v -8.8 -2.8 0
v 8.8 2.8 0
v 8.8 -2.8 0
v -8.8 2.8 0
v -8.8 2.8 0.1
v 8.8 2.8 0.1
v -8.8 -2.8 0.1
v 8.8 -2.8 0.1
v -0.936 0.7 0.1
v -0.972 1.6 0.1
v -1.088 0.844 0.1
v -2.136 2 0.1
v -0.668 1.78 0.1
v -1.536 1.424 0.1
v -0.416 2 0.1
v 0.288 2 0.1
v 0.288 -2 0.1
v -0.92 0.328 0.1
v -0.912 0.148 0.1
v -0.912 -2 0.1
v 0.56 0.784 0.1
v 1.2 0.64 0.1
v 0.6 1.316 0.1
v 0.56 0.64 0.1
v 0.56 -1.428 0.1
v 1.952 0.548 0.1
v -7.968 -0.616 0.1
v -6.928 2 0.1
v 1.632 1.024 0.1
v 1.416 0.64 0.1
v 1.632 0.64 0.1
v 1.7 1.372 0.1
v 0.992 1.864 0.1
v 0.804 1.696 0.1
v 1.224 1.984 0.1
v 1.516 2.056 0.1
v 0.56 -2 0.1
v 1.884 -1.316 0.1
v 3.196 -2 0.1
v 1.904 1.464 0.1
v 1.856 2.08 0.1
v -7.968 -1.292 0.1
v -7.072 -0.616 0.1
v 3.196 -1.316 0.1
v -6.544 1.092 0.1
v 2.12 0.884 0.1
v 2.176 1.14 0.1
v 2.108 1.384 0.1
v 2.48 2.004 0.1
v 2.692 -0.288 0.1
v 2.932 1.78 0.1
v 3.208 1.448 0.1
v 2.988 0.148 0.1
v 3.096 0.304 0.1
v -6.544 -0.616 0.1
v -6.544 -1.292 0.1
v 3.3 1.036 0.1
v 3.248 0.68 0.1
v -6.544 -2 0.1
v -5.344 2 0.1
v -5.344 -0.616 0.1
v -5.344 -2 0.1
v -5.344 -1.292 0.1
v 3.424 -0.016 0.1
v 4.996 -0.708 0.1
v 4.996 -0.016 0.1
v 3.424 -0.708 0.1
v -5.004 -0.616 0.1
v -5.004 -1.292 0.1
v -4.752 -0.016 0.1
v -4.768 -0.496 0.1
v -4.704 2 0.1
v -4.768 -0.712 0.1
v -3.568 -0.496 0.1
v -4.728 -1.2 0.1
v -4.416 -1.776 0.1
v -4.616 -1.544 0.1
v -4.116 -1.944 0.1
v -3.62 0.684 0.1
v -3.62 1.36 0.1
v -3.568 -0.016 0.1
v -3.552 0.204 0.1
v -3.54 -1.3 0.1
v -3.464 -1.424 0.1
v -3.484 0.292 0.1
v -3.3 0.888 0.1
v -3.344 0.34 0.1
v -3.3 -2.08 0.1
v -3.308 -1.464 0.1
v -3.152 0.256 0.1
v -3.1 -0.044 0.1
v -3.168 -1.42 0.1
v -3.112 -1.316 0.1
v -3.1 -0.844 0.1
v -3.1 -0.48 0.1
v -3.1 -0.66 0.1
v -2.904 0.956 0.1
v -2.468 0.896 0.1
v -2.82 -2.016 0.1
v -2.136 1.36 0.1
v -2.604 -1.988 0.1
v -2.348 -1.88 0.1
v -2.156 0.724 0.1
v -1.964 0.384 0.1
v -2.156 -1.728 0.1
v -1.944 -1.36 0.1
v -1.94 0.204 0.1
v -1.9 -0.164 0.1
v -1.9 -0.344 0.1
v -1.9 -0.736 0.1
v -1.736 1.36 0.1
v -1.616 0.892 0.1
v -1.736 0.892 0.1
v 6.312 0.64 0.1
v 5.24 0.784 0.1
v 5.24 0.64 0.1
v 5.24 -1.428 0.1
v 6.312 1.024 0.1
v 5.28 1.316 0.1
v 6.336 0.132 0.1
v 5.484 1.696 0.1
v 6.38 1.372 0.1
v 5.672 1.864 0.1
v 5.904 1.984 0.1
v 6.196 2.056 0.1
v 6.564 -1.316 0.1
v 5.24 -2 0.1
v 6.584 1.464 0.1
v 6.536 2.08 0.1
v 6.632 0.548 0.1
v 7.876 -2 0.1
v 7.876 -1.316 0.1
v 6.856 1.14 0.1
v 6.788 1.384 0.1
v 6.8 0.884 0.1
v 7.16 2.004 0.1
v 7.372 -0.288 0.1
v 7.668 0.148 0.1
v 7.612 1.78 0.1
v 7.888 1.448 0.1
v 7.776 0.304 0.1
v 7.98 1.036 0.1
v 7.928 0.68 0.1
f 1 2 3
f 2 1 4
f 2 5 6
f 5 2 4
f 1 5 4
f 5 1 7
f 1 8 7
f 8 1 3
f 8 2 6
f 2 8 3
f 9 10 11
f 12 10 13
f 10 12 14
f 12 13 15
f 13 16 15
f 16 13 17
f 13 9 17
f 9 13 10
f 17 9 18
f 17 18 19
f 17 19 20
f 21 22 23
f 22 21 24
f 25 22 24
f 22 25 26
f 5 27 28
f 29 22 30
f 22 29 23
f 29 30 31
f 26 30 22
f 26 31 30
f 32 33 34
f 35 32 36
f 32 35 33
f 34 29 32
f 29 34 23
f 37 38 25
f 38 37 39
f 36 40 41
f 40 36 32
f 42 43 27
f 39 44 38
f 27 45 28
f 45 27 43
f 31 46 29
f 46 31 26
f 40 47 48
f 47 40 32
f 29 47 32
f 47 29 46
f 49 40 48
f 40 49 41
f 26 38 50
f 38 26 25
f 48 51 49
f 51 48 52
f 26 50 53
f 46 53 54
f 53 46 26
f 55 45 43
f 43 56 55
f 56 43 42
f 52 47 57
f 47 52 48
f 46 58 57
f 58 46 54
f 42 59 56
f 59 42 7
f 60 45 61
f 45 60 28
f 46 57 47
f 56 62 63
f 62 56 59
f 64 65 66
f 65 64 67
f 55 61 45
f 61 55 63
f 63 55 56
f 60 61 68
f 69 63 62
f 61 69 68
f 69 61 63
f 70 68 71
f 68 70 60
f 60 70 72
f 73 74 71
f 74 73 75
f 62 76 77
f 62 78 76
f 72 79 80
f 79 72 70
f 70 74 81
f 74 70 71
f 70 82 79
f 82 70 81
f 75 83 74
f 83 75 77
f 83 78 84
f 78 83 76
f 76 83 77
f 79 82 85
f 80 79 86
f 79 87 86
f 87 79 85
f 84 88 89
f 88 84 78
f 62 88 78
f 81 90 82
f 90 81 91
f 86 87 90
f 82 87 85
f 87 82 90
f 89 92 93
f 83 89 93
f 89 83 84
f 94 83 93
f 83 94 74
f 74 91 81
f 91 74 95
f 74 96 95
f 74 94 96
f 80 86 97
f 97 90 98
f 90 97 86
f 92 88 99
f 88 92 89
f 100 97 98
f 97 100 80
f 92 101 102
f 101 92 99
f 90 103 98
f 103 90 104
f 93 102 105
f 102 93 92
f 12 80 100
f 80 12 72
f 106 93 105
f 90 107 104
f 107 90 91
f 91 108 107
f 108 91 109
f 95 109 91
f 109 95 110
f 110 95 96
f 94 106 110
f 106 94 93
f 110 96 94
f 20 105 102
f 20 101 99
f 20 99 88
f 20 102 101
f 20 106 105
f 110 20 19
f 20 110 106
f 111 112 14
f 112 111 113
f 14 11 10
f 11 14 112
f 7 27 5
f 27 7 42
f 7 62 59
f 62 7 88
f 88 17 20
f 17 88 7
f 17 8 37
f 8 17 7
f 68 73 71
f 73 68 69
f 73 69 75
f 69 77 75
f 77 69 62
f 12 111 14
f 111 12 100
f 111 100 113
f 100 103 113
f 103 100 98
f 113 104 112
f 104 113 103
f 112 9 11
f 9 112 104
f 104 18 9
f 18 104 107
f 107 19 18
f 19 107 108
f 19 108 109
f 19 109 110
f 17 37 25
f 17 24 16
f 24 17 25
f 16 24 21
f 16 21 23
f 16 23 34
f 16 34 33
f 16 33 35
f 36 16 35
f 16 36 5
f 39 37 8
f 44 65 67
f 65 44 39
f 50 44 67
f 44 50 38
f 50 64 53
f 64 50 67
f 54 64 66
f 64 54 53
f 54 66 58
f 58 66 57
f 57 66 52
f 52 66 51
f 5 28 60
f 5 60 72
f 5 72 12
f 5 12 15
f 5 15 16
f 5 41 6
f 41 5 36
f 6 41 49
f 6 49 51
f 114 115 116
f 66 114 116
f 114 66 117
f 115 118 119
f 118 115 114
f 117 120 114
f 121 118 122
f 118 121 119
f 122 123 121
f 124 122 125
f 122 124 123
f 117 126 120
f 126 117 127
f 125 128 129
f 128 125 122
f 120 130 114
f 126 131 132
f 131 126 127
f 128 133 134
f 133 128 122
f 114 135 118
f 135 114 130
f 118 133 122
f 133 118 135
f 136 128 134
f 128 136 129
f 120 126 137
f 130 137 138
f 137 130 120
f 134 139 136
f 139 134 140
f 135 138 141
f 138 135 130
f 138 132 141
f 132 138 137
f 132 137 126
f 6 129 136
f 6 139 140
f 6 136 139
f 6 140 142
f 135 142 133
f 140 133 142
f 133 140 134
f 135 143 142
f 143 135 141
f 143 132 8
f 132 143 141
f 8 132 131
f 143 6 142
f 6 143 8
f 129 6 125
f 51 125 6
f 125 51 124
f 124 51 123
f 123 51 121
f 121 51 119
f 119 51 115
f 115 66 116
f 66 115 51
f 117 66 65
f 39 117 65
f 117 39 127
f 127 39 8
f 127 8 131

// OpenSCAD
// file: ../p/box5-12.scad
use <../lib.scad>
function ldraw_lib__box5_12() = [
// 0 Box with 5 Faces without Any Edges
// 0 Name: box5-12.dat
// 0 Author: Chris Dee [cwdee]
// 0 !LDRAW_ORG Primitive UPDATE 2009-02
// 0 !LICENSE Licensed under CC BY 4.0 : see CAreadme.txt
// 
// 0 BFC CERTIFY CCW
  [0,"BFC","CERTIFY"],
  [0,"BFC","CCW"],
// 
// 0 !HISTORY 2009-09-03 [PTadmin] Official Update 2009-02
// 
// 
// 4 16 1 1 1 1 1 -1 -1 1 -1 -1 1 1
  [4,16,1,1,1,1,1,-1,-1,1,-1,-1,1,1],
// 4 16 -1 0 1 1 0 1 1 1 1 -1 1 1
  [4,16,-1,0,1,1,0,1,1,1,1,-1,1,1],
// 4 16 -1 0 -1 -1 0 1 -1 1 1 -1 1 -1
  [4,16,-1,0,-1,-1,0,1,-1,1,1,-1,1,-1],
// 4 16 1 0 -1 -1 0 -1 -1 1 -1 1 1 -1
  [4,16,1,0,-1,-1,0,-1,-1,1,-1,1,1,-1],
// 4 16 1 0 1 1 0 -1 1 1 -1 1 1 1
  [4,16,1,0,1,1,0,-1,1,1,-1,1,1,1],
// 0
];
module ldraw_lib__box5_12(step=0, col=false, unit=2/5, alt=false, line=0.2, solid=!$preview)
    makepoly(ldraw_lib__box5_12(), step=step, col=col, unit=unit, alt=alt, line=line, solid=solid);
ldraw_lib__box5_12(line=0.2);
// main file
use <../lib.scad>
use <s/4201639hs01.scad>
function ldraw_lib__4201639i() = [
// 0 Sticker  0.7 x  2.2 with White "4512-2" on Black Background
// 0 Name: 4201639i.dat
// 0 Author: Gerald Lasser [GeraldLasser]
// 0 !LDRAW_ORG Part UPDATE 2024-04
// 0 !LICENSE Licensed under CC BY 4.0 : see CAreadme.txt
// 
// 0 BFC CERTIFY CCW
  [0,"BFC","CERTIFY"],
  [0,"BFC","CCW"],
// 
// 0 !KEYWORDS Set 4512
// 
// 0 !HISTORY 2024-05-28 [OrionP] Official Update 2024-04
// 
// 
// 1 16 0 0 0 1 0 0 0 1 0 0 0 1 s\4201639hs01.dat
  [1,16,0,0,0,1,0,0,0,1,0,0,0,1, ldraw_lib__s__4201639hs01()],
// 
// 0 // Digit 2
// 3 15 15.78 -.25 1.6 13.1 -.25 1.96 13.1 -.25 1.6
  [3,15,15.78,-.25,1.6,13.1,-.25,1.96,13.1,-.25,1.6],
// 4 0 12.49 -.25 -.04 13.1 -.25 -3.57 15.78 -.25 1.6 13.1 -.25 1.6
  [4,0,12.49,-.25,-.04,13.1,-.25,-3.57,15.78,-.25,1.6,13.1,-.25,1.6],
// 4 15 13.1 -.25 1.96 15.78 -.25 1.6 15.78 -.25 2.56 13.2 -.25 3.29
  [4,15,13.1,-.25,1.96,15.78,-.25,1.6,15.78,-.25,2.56,13.2,-.25,3.29],
// 3 0 13.1 -.25 -3.57 15.84 -.25 .33 15.78 -.25 1.6
  [3,0,13.1,-.25,-3.57,15.84,-.25,.33,15.78,-.25,1.6],
// 4 15 13.71 -.25 4.24 13.2 -.25 3.29 15.78 -.25 2.56 15.95 -.25 3.43
  [4,15,13.71,-.25,4.24,13.2,-.25,3.29,15.78,-.25,2.56,15.95,-.25,3.43],
// 3 15 15.95 -.25 3.43 14.18 -.25 4.66 13.71 -.25 4.24
  [3,15,15.95,-.25,3.43,14.18,-.25,4.66,13.71,-.25,4.24],
// 4 15 14.18 -.25 4.66 15.95 -.25 3.43 15.49 -.25 5.14 14.76 -.25 4.96
  [4,15,14.18,-.25,4.66,15.95,-.25,3.43,15.49,-.25,5.14,14.76,-.25,4.96],
// 4 15 15.84 -.25 .33 13.1 -.25 -3.57 13.1 -.25 -5 16.41 -.25 -3.29
  [4,15,15.84,-.25,.33,13.1,-.25,-3.57,13.1,-.25,-5,16.41,-.25,-3.29],
// 4 15 16.34 -.25 5.2 15.49 -.25 5.14 15.95 -.25 3.43 16.46 -.25 3.66
  [4,15,16.34,-.25,5.2,15.49,-.25,5.14,15.95,-.25,3.43,16.46,-.25,3.66],
// 3 0 15.84 -.25 .33 16.58 -.25 1.37 15.78 -.25 1.6
  [3,0,15.84,-.25,.33,16.58,-.25,1.37,15.78,-.25,1.6],
// 4 15 13.1 -.25 -5 19.69 -.25 -5 19.69 -.25 -3.29 16.41 -.25 -3.29
  [4,15,13.1,-.25,-5,19.69,-.25,-5,19.69,-.25,-3.29,16.41,-.25,-3.29],
// 4 0 17.14 -.25 2.85 16.97 -.25 3.46 16.46 -.25 3.66 15.95 -.25 3.43
  [4,0,17.14,-.25,2.85,16.97,-.25,3.46,16.46,-.25,3.66,15.95,-.25,3.43],
// 4 0 16.58 -.25 1.37 17 -.25 2.21 15.78 -.25 2.56 15.78 -.25 1.6
  [4,0,16.58,-.25,1.37,17,-.25,2.21,15.78,-.25,2.56,15.78,-.25,1.6],
// 4 0 15.95 -.25 3.43 15.78 -.25 2.56 17 -.25 2.21 17.14 -.25 2.85
  [4,0,15.95,-.25,3.43,15.78,-.25,2.56,17,-.25,2.21,17.14,-.25,2.85],
// 4 15 16.34 -.25 5.2 16.46 -.25 3.66 16.97 -.25 3.46 17.9 -.25 5.01
  [4,15,16.34,-.25,5.2,16.46,-.25,3.66,16.97,-.25,3.46,17.9,-.25,5.01],
// 3 15 15.84 -.25 .33 16.41 -.25 -3.29 18.43 -.25 -.72
  [3,15,15.84,-.25,.33,16.41,-.25,-3.29,18.43,-.25,-.72],
// 4 15 19.17 -.25 .37 16.58 -.25 1.37 15.84 -.25 .33 18.43 -.25 -.72
  [4,15,19.17,-.25,.37,16.58,-.25,1.37,15.84,-.25,.33,18.43,-.25,-.72],
// 4 15 19.72 -.25 3.62 19.03 -.25 4.45 17.9 -.25 5.01 16.97 -.25 3.46
  [4,15,19.72,-.25,3.62,19.03,-.25,4.45,17.9,-.25,5.01,16.97,-.25,3.46],
// 4 15 17 -.25 2.21 16.58 -.25 1.37 19.17 -.25 .37 19.44 -.25 .76
  [4,15,17,-.25,2.21,16.58,-.25,1.37,19.17,-.25,.37,19.44,-.25,.76],
// 4 0 18.43 -.25 -.72 19.69 -.25 -3.29 19.44 -.25 .76 19.17 -.25 .37
  [4,0,18.43,-.25,-.72,19.69,-.25,-3.29,19.44,-.25,.76,19.17,-.25,.37],
// 3 0 19.69 -.25 -3.29 18.43 -.25 -.72 16.41 -.25 -3.29
  [3,0,19.69,-.25,-3.29,18.43,-.25,-.72,16.41,-.25,-3.29],
// 3 0 22 -.25 7 16.34 -.25 5.2 17.9 -.25 5.01
  [3,0,22,-.25,7,16.34,-.25,5.2,17.9,-.25,5.01],
// 3 0 22 -.25 7 19.03 -.25 4.45 19.72 -.25 3.62
  [3,0,22,-.25,7,19.03,-.25,4.45,19.72,-.25,3.62],
// 3 0 22 -.25 7 17.9 -.25 5.01 19.03 -.25 4.45
  [3,0,22,-.25,7,17.9,-.25,5.01,19.03,-.25,4.45],
// 3 0 22 -.25 7 19.72 -.25 3.62 19.95 -.25 2.59
  [3,0,22,-.25,7,19.72,-.25,3.62,19.95,-.25,2.59],
// 3 15 17 -.25 2.21 19.95 -.25 2.59 17.14 -.25 2.85
  [3,15,17,-.25,2.21,19.95,-.25,2.59,17.14,-.25,2.85],
// 4 15 16.97 -.25 3.46 17.14 -.25 2.85 19.95 -.25 2.59 19.72 -.25 3.62
  [4,15,16.97,-.25,3.46,17.14,-.25,2.85,19.95,-.25,2.59,19.72,-.25,3.62],
// 4 15 19.44 -.25 .76 19.82 -.25 1.7 19.95 -.25 2.59 17 -.25 2.21
  [4,15,19.44,-.25,.76,19.82,-.25,1.7,19.95,-.25,2.59,17,-.25,2.21],
// 4 0 19.44 -.25 .76 19.69 -.25 -3.29 22 -.25 -7 19.82 -.25 1.7
  [4,0,19.44,-.25,.76,19.69,-.25,-3.29,22,-.25,-7,19.82,-.25,1.7],
// 3 0 22 -.25 -7 19.69 -.25 -3.29 19.69 -.25 -5
  [3,0,22,-.25,-7,19.69,-.25,-3.29,19.69,-.25,-5],
// 4 0 22 -.25 7 19.95 -.25 2.59 19.82 -.25 1.7 22 -.25 -7
  [4,0,22,-.25,7,19.95,-.25,2.59,19.82,-.25,1.7,22,-.25,-7],
// 3 0 16.34 -.25 5.2 22 -.25 7 15.49 -.25 5.14
  [3,0,16.34,-.25,5.2,22,-.25,7,15.49,-.25,5.14],
// 4 0 14.76 -.25 4.96 15.49 -.25 5.14 22 -.25 7 7.33 -.25 4.45
  [4,0,14.76,-.25,4.96,15.49,-.25,5.14,22,-.25,7,7.33,-.25,4.45],
// 3 0 14.76 -.25 4.96 7.33 -.25 4.45 14.18 -.25 4.66
  [3,0,14.76,-.25,4.96,7.33,-.25,4.45,14.18,-.25,4.66],
// 3 0 14.18 -.25 4.66 7.33 -.25 4.45 13.71 -.25 4.24
  [3,0,14.18,-.25,4.66,7.33,-.25,4.45,13.71,-.25,4.24],
// 3 0 13.71 -.25 4.24 7.33 -.25 4.45 13.2 -.25 3.29
  [3,0,13.71,-.25,4.24,7.33,-.25,4.45,13.2,-.25,3.29],
// 3 0 13.2 -.25 3.29 7.33 -.25 4.45 13.1 -.25 1.96
  [3,0,13.2,-.25,3.29,7.33,-.25,4.45,13.1,-.25,1.96],
// 4 0 13.1 -.25 1.96 7.33 -.25 4.45 12.49 -.25 -.04 13.1 -.25 1.6
  [4,0,13.1,-.25,1.96,7.33,-.25,4.45,12.49,-.25,-.04,13.1,-.25,1.6],
// 3 0 13.1 -.25 -3.57 12.49 -.25 -.04 12.49 -.25 -1.77
  [3,0,13.1,-.25,-3.57,12.49,-.25,-.04,12.49,-.25,-1.77],
// 4 0 12.49 -.25 -1.77 7.99 -.25 -5 13.1 -.25 -5 13.1 -.25 -3.57
  [4,0,12.49,-.25,-1.77,7.99,-.25,-5,13.1,-.25,-5,13.1,-.25,-3.57],
// 3 0 13.1 -.25 -5 7.99 -.25 -5 22 -.25 -7
  [3,0,13.1,-.25,-5,7.99,-.25,-5,22,-.25,-7],
// 3 0 13.1 -.25 -5 22 -.25 -7 19.69 -.25 -5
  [3,0,13.1,-.25,-5,22,-.25,-7,19.69,-.25,-5],
];
module ldraw_lib__4201639i(step=0, col=false, unit=2/5, alt=false, line=0.2, solid=!$preview)
    makepoly(ldraw_lib__4201639i(), step=step, col=col, unit=unit, alt=alt, line=line, solid=solid);
ldraw_lib__4201639i(line=0.2);
